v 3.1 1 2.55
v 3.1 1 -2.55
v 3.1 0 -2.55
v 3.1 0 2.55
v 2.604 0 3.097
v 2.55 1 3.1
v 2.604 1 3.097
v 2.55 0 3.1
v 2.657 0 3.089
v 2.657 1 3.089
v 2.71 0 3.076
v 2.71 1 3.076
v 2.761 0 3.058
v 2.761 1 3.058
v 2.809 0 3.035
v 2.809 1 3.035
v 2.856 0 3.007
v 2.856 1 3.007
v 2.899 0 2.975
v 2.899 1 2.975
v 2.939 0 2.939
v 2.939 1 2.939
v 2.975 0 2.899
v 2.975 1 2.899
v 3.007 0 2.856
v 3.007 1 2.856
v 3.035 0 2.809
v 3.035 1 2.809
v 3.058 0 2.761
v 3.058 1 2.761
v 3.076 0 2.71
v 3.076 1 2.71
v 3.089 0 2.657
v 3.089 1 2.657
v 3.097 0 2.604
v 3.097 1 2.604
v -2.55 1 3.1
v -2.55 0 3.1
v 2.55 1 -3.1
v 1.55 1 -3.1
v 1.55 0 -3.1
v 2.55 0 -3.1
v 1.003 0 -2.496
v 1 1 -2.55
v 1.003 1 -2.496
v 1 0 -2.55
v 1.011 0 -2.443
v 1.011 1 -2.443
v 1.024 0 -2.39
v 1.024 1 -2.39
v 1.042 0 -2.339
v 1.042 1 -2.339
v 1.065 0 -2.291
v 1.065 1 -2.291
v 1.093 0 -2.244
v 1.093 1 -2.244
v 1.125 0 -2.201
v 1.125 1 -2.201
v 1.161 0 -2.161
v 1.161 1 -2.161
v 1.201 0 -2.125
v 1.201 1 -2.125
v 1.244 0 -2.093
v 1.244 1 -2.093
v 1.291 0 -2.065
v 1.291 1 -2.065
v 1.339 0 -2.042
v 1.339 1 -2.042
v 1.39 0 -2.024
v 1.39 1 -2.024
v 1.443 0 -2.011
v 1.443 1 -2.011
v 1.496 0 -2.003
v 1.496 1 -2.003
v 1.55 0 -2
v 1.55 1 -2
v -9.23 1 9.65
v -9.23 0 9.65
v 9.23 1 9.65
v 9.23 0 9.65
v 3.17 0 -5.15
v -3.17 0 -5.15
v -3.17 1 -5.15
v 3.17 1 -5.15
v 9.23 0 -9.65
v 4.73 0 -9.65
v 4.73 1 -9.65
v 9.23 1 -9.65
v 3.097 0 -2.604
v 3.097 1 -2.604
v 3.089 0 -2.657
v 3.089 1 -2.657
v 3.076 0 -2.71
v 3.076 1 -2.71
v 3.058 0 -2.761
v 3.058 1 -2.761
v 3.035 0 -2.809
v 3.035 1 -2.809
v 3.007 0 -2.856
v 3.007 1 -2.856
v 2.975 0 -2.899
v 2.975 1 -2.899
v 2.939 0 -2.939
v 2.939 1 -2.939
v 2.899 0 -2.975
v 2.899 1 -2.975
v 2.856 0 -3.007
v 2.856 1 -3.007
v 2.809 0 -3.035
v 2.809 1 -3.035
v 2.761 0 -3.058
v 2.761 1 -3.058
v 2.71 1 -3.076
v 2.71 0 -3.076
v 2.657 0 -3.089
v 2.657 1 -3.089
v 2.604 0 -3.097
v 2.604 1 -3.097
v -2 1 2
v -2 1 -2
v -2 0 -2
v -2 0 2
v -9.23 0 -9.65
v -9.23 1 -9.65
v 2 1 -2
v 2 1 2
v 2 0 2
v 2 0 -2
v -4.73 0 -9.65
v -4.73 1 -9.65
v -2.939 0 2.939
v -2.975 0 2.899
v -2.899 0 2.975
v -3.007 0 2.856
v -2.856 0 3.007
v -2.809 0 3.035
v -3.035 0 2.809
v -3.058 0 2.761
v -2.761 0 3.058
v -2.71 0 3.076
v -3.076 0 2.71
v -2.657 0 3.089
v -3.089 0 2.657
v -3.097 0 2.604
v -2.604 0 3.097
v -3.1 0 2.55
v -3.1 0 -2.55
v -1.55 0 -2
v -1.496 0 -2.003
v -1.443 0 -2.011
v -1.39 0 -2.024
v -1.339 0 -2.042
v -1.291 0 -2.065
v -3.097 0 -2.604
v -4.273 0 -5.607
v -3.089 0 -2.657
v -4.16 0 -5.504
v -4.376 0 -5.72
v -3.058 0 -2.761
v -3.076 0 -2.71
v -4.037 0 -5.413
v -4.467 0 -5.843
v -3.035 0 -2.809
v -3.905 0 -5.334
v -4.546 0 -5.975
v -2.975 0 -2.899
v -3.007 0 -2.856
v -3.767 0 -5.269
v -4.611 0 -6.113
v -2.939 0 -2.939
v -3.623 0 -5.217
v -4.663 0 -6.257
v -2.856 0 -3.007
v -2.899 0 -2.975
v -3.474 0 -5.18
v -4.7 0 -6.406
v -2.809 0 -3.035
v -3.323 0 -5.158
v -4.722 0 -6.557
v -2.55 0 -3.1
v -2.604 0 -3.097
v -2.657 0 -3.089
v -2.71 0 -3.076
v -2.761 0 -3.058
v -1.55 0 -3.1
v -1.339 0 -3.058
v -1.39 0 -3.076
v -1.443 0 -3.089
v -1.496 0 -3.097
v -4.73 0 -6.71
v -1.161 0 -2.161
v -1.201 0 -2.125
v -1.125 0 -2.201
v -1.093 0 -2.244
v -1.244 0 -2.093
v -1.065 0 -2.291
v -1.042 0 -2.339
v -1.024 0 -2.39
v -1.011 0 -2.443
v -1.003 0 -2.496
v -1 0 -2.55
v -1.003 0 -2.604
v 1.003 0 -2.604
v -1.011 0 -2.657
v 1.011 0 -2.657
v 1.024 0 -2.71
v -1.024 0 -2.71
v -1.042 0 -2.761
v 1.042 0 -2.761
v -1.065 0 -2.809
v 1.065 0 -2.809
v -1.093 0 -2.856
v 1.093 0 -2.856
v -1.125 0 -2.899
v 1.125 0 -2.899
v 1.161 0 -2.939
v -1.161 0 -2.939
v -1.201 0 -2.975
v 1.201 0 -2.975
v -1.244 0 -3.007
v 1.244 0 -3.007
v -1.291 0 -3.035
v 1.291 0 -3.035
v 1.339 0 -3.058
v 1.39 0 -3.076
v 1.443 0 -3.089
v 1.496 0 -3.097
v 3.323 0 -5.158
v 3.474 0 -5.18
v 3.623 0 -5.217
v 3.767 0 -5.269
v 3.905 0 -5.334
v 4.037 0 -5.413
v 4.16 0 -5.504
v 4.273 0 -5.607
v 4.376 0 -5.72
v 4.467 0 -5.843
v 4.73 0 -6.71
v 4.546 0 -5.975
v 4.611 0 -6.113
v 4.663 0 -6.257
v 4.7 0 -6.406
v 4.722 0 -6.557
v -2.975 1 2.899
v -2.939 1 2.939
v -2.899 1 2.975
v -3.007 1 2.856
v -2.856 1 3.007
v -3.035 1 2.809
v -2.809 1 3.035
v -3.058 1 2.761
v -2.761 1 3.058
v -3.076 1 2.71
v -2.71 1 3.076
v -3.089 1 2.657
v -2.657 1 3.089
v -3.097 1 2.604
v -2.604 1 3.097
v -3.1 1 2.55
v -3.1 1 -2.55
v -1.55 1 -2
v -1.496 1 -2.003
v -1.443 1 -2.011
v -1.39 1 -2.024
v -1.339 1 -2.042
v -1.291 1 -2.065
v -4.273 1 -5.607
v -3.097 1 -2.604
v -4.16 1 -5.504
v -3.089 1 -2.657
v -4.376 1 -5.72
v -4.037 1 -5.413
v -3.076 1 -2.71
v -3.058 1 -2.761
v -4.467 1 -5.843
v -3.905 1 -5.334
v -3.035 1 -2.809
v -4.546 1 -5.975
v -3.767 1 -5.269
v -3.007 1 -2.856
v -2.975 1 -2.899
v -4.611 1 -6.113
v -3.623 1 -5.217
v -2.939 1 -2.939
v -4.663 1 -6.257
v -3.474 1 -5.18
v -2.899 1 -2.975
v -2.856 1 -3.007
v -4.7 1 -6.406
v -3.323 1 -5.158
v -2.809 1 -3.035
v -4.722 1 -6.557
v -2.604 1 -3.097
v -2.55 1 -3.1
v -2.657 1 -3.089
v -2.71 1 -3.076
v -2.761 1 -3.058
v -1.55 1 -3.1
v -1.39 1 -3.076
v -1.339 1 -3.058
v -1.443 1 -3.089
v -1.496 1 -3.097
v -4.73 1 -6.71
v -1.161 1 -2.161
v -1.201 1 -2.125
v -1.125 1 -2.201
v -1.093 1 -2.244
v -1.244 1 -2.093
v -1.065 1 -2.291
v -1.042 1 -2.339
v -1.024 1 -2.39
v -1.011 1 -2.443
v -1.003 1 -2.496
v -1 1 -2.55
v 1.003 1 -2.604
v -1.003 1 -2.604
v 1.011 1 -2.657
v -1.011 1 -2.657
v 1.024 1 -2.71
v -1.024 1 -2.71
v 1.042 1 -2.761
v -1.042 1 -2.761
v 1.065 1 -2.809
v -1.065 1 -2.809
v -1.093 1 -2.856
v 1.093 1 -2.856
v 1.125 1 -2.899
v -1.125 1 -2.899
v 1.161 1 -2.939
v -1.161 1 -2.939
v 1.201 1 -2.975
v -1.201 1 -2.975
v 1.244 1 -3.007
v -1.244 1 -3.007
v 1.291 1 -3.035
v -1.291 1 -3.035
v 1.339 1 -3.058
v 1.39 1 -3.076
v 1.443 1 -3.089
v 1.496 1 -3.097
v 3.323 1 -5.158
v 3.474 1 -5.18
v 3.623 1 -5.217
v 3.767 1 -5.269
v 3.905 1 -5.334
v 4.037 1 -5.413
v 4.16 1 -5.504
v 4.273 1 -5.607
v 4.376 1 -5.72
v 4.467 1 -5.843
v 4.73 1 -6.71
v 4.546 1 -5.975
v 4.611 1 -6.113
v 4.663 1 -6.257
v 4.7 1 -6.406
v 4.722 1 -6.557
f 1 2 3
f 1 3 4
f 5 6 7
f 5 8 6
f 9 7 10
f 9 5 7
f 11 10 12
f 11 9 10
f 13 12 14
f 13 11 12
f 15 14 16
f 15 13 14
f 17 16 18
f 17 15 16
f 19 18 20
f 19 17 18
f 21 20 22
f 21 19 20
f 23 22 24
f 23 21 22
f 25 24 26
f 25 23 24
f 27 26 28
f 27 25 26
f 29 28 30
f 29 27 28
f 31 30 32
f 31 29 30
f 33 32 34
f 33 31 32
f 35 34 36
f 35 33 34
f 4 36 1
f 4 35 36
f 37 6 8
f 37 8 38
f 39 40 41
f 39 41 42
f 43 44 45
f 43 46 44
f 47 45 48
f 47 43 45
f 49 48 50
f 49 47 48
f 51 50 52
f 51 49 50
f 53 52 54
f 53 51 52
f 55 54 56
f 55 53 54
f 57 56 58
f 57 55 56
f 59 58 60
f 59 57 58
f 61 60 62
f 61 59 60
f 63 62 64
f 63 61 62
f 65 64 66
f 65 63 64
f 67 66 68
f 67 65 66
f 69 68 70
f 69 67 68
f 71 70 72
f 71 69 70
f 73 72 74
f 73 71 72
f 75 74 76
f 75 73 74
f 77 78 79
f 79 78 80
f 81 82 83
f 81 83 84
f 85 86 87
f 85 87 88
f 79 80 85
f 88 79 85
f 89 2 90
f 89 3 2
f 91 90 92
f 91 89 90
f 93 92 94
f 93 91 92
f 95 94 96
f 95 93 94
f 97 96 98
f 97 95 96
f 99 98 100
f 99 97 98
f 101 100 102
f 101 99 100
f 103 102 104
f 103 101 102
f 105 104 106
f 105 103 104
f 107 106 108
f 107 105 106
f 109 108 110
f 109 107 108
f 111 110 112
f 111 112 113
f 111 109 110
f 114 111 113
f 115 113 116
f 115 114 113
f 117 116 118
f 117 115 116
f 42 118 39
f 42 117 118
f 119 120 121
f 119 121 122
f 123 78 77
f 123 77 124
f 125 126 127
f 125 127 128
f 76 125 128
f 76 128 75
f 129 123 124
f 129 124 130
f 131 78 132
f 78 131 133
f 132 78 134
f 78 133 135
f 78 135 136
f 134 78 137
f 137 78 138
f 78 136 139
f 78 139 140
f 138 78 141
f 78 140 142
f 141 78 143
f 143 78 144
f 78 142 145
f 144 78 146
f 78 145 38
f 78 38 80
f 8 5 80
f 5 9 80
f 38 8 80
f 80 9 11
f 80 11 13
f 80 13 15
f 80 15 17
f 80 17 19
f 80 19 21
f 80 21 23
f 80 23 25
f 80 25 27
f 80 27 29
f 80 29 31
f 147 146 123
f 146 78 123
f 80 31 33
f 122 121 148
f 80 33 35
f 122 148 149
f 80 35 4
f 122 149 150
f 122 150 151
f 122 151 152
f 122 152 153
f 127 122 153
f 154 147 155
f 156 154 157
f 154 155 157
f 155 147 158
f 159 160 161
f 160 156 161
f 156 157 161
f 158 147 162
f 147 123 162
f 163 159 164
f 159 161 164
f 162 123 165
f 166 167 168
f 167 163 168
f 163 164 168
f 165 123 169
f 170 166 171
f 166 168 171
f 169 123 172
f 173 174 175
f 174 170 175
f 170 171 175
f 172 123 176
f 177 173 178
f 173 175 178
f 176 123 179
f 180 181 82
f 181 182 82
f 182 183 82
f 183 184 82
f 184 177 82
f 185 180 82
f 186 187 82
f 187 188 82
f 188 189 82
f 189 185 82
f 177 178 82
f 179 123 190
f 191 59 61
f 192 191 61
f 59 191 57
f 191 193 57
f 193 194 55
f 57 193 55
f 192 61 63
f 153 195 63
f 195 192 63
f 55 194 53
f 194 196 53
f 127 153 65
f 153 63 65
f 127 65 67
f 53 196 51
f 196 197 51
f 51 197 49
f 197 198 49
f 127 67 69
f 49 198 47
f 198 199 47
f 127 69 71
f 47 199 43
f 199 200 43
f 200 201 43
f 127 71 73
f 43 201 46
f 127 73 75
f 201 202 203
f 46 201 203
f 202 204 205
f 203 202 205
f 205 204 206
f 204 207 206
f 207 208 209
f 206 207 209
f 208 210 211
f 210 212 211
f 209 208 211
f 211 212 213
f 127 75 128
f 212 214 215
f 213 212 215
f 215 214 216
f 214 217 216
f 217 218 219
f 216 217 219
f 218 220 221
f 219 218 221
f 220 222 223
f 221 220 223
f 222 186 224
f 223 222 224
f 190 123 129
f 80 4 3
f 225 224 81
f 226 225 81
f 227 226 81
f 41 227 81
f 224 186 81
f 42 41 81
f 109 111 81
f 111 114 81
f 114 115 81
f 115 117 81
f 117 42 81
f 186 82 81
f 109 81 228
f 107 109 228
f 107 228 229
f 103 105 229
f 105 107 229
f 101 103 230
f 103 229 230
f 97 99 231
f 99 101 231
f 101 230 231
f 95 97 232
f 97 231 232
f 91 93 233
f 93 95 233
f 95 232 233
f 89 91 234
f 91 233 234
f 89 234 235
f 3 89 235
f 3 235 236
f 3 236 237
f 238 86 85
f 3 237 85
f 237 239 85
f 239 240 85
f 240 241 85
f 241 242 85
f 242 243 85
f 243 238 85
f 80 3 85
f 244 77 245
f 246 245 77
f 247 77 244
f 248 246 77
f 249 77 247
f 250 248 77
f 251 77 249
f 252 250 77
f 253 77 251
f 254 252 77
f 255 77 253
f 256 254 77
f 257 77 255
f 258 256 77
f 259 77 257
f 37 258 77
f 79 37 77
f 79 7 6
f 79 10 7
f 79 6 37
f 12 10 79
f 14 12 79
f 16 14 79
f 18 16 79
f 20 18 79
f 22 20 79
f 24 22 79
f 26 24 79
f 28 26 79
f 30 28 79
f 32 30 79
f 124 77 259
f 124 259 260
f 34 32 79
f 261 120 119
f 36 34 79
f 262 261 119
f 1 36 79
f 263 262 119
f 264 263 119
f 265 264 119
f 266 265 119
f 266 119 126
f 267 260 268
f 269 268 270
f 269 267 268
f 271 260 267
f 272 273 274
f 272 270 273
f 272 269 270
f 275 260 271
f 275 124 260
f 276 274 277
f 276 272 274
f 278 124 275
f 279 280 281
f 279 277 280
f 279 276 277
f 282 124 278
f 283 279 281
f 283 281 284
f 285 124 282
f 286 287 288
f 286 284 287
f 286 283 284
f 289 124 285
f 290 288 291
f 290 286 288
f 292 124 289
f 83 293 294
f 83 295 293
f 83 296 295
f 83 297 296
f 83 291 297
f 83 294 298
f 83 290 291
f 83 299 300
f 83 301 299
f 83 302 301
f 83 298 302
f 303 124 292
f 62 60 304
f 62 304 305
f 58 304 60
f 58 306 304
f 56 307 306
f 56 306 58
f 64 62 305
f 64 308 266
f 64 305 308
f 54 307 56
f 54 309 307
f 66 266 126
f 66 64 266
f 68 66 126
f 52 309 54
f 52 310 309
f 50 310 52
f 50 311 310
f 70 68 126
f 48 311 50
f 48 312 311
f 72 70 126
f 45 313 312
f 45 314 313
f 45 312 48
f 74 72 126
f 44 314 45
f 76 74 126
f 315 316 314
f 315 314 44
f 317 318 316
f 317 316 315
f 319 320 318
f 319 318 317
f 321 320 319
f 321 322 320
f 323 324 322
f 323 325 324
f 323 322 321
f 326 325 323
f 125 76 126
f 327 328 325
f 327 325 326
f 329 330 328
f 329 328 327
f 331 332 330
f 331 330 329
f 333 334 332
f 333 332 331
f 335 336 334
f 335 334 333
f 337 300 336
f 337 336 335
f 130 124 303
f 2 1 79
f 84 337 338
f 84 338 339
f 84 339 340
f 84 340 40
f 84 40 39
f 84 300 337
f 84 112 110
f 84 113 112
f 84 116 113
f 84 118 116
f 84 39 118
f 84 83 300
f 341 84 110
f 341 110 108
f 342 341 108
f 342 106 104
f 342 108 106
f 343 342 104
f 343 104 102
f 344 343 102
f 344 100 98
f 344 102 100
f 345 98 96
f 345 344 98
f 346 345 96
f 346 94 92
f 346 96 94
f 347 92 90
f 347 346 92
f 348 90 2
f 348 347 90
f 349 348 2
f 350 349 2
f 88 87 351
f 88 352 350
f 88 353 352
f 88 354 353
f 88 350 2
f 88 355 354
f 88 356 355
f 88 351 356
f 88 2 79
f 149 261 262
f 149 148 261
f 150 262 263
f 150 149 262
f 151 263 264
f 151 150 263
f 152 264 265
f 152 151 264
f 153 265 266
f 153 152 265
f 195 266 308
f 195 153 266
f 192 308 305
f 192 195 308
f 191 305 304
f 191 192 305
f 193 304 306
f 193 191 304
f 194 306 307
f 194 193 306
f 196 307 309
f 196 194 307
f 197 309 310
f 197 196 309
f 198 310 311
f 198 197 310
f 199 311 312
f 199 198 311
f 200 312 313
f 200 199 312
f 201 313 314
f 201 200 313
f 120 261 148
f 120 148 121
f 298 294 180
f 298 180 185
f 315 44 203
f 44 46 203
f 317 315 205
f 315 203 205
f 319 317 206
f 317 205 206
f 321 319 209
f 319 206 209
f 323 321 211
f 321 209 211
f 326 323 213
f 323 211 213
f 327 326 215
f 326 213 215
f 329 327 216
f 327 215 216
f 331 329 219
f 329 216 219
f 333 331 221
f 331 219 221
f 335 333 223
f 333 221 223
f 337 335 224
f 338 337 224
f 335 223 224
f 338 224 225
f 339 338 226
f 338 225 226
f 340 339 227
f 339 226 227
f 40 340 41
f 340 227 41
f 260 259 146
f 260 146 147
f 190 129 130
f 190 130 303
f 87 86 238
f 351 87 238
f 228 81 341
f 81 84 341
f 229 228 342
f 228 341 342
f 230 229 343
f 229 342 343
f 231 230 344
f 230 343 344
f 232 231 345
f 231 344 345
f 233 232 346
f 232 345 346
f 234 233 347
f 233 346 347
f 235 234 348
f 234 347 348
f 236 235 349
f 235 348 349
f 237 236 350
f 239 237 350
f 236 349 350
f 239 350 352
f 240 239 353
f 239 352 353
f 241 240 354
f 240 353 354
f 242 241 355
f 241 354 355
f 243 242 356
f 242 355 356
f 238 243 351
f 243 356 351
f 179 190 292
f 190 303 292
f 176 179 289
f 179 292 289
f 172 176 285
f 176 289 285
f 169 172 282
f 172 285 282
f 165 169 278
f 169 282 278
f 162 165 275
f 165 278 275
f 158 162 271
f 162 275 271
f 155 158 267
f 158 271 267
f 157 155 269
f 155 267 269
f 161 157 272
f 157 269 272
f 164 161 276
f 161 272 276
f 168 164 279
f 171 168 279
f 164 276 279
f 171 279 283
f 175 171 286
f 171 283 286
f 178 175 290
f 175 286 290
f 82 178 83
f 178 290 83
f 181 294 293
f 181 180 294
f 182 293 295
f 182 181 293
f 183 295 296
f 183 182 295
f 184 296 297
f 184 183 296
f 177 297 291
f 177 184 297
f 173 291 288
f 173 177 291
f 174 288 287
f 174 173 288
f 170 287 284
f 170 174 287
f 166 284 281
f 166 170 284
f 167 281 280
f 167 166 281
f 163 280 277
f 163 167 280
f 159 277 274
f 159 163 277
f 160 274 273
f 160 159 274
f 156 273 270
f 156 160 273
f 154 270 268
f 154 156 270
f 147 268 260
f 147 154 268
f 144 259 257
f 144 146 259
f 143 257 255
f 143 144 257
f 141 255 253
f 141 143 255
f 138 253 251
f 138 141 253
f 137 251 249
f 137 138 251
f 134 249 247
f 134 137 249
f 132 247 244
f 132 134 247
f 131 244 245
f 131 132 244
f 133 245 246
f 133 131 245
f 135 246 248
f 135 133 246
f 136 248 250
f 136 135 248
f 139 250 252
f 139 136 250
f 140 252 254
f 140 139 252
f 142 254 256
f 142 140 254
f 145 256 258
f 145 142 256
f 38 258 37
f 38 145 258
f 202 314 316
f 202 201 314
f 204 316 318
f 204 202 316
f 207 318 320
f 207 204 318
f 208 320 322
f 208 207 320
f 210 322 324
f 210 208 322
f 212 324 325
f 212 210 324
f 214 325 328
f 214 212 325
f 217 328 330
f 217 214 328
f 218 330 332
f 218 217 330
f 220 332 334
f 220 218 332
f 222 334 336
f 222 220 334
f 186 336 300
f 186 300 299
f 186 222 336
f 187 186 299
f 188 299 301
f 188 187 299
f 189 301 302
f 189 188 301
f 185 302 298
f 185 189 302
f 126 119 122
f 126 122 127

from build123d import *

# Parameters (mm, degrees)
SKETCH_1_W          = 18.46
SKETCH_1_H          = 19.3
EXTRUDE_1_DEPTH     = 1
SKETCH_2_W          = 9.46
SKETCH_2_H          = 4.5
CUT_EXTRUDE_1_DEPTH = 14.390870024
FILLET_1_R          = 1.56
CUT_EXTRUDE_2_DEPTH = 14.390870024
FILLET_7_R          = 0.55


with BuildPart() as part:
    # 草图1 → 凸台-拉伸1 (new body)
    with BuildSketch(Plane(origin=(0, 0, 0), x_dir=(1, 0, 0), z_dir=(0, 1, 0))):
        Rectangle(SKETCH_1_W, SKETCH_1_H)
    extrude(amount=EXTRUDE_1_DEPTH)

    # 草图2 → 切除-拉伸1 (cut, through all)
    with BuildSketch(Plane.XZ):
        with Locations((0, -7.4)):
            Rectangle(SKETCH_2_W, SKETCH_2_H)
    extrude(amount=-CUT_EXTRUDE_1_DEPTH, mode=Mode.SUBTRACT)

    # 圆角1
    fillet_1_edges = [part.edges().sort_by_distance(p)[0] for p in [
        (4.73, 0.5, -5.15),
        (-4.73, 0.5, -5.15),
    ]]
    fillet(fillet_1_edges, radius=FILLET_1_R)

    # 草图3 → 切除-拉伸2 (cut, through all)
    with BuildSketch(Plane(origin=(0, 1, 0), x_dir=(1, 0, 0), z_dir=(0, 1, 0))):
        Polygon((1, 3.1), (3.1, 3.1), (3.1, -3.1), (-3.1, -3.1), (-3.1, 3.1), (-1, 3.1), (-1, 2), (-2, 2), (-2, -2), (2, -2), (2, 2), (1, 2), align=None)
    extrude(amount=-CUT_EXTRUDE_2_DEPTH, mode=Mode.SUBTRACT)

    # 圆角7
    fillet_7_edges = [part.edges().sort_by_distance(p)[0] for p in [
        (-1, 0.5, -2),
        (1, 0.5, -2),
        (-3.1, 0.5, 3.1),
        (-1, 0.5, -3.1),
        (-3.1, 0.5, -3.1),
        (1, 0.5, -3.1),
        (3.1, 0.5, -3.1),
        (3.1, 0.5, 3.1),
    ]]
    fillet(fillet_7_edges, radius=FILLET_7_R - 0.0001)  # a hair under: the kernel refuses the full size


solid = part.part
